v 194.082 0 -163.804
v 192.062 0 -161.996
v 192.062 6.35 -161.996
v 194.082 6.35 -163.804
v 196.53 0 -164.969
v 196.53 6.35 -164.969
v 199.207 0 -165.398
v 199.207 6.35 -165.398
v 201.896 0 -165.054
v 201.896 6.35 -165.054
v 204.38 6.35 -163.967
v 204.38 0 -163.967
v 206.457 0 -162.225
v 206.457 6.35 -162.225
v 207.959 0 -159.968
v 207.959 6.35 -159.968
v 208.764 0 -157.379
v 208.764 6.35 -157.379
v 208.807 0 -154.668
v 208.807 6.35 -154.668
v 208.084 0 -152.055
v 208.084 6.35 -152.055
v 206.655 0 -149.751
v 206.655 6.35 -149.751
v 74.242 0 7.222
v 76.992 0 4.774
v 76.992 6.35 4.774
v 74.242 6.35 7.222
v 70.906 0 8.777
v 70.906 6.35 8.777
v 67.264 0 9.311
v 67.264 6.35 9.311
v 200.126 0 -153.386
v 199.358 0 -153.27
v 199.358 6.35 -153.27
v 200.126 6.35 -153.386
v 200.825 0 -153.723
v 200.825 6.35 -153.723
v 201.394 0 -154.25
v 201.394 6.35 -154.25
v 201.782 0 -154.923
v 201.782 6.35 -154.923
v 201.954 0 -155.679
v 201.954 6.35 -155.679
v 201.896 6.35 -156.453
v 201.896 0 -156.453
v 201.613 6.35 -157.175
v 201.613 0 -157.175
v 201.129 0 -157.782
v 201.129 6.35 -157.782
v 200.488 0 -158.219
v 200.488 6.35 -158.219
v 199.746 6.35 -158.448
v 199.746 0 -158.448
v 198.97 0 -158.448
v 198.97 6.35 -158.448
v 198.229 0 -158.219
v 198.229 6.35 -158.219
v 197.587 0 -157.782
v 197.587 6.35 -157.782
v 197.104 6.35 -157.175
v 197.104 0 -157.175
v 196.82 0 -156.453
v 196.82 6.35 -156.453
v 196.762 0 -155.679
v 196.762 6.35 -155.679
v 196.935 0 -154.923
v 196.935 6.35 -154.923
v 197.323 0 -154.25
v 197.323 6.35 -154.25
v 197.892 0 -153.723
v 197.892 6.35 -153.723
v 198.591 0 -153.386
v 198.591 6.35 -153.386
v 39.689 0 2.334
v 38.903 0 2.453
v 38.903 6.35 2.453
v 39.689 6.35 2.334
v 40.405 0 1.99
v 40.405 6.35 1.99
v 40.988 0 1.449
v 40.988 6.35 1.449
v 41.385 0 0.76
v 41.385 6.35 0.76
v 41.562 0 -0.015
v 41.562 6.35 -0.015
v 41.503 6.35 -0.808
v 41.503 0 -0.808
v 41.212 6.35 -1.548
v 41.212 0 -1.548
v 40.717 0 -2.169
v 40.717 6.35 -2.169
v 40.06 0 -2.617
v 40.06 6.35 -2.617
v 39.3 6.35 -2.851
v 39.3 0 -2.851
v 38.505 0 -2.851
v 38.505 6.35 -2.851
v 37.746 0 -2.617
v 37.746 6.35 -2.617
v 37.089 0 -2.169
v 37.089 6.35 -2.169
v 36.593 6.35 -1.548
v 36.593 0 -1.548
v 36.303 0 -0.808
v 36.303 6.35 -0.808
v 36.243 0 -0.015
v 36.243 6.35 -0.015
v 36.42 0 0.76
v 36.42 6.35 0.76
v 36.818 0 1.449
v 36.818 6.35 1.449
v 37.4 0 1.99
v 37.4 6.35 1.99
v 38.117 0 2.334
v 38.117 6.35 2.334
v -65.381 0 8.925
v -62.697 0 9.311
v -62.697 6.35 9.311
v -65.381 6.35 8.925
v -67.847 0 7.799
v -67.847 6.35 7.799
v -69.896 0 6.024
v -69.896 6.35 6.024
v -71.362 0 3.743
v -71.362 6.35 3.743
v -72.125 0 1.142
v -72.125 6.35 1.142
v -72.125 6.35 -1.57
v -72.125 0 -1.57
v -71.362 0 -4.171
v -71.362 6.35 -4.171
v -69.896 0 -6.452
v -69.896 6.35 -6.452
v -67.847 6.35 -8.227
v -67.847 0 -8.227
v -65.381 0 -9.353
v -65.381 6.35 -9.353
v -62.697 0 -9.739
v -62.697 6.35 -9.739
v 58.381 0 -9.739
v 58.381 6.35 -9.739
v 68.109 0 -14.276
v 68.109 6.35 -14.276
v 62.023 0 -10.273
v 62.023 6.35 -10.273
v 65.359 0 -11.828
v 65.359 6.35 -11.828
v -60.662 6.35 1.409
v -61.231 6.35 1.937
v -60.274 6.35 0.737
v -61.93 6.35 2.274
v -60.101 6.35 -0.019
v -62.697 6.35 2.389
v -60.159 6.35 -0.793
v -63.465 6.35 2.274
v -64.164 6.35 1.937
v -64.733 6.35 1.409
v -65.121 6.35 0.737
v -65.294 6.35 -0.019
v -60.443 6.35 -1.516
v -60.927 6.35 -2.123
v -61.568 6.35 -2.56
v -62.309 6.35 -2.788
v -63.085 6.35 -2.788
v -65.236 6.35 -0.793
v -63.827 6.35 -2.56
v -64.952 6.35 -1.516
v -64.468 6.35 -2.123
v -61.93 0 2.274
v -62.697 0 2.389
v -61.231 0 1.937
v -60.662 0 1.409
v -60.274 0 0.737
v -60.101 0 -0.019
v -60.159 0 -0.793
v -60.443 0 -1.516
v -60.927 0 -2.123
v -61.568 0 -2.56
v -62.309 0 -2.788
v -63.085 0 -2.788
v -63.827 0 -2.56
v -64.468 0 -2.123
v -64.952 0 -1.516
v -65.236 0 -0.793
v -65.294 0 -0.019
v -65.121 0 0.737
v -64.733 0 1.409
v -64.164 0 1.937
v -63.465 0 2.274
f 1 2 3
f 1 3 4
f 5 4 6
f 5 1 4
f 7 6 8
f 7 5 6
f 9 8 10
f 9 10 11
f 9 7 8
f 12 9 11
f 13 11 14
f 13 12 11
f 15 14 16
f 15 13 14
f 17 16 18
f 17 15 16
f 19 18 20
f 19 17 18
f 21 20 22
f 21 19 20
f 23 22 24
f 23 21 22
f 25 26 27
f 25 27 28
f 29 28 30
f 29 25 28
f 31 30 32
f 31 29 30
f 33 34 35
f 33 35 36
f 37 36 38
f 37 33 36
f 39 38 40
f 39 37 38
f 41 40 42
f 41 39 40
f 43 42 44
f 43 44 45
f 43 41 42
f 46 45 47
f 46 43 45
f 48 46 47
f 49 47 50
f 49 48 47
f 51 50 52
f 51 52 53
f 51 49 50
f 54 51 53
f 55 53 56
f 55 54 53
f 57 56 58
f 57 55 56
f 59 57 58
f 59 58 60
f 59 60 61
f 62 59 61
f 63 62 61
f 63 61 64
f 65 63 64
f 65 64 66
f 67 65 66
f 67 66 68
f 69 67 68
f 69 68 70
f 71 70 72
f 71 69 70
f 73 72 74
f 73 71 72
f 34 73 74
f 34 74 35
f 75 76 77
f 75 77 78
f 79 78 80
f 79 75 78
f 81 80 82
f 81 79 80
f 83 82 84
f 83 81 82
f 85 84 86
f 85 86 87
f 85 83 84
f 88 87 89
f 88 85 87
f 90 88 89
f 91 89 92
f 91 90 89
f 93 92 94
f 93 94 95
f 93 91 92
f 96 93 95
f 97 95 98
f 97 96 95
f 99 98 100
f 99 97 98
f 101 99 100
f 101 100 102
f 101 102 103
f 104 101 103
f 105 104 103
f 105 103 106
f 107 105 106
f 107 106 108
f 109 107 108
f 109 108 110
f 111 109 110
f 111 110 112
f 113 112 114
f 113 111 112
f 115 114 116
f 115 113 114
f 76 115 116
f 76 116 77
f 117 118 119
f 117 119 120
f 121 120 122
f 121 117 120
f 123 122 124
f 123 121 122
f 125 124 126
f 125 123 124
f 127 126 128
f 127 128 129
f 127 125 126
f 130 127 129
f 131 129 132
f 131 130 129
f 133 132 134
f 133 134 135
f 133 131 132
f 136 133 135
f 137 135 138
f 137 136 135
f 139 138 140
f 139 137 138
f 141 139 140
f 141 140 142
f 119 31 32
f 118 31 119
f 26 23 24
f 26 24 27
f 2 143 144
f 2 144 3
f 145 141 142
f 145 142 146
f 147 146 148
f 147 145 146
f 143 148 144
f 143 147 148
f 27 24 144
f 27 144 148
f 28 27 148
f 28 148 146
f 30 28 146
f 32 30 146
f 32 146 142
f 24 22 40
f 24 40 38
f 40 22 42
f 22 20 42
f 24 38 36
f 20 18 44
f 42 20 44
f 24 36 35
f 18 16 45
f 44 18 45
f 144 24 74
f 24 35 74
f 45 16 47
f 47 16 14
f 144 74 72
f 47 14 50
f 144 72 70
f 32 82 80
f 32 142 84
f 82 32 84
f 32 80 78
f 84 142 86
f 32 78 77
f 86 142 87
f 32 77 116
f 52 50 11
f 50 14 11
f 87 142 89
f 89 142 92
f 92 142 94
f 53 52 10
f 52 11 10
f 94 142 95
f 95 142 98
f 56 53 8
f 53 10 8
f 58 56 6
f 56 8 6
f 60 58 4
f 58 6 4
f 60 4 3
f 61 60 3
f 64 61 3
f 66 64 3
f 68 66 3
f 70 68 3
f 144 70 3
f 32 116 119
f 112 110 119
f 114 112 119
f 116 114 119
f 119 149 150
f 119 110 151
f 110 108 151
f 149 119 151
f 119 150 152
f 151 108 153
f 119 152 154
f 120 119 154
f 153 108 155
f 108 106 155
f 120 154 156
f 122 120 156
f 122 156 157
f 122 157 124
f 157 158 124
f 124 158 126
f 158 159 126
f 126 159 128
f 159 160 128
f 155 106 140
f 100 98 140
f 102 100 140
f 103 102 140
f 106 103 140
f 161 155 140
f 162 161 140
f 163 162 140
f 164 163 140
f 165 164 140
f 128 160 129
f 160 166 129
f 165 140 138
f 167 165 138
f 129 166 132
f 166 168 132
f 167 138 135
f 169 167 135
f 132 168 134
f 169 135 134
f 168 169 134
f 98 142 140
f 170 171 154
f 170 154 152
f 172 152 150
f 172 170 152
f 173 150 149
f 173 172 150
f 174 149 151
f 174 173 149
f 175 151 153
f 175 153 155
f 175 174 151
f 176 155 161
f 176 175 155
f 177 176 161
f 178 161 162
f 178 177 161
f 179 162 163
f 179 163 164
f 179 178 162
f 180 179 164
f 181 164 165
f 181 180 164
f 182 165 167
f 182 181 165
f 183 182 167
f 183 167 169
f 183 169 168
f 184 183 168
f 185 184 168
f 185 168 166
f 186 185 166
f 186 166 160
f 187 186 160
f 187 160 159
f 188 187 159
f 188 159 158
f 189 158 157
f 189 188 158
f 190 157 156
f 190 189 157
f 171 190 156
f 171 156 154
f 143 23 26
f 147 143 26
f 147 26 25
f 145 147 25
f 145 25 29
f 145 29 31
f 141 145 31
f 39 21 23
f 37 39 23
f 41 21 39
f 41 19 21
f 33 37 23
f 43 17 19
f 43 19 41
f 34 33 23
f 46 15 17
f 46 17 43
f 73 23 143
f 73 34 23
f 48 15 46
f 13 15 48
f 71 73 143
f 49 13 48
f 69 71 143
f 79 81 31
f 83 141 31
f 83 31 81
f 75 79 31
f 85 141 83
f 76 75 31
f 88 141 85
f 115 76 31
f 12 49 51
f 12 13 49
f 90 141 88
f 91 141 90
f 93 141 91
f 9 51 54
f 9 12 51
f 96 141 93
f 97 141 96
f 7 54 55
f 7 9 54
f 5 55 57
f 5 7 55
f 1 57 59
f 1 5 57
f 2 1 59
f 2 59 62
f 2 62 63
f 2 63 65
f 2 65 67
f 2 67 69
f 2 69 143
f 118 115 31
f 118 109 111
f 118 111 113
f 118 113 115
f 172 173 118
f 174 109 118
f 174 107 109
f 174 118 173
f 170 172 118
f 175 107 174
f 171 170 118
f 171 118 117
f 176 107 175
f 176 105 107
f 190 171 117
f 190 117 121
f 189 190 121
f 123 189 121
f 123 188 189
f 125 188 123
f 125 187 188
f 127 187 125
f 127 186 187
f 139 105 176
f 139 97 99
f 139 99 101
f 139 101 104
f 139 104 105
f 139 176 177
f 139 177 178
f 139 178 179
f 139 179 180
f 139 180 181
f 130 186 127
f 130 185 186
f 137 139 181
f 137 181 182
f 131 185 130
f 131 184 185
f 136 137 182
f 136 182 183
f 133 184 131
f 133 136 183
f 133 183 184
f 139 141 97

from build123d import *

# Parameters (mm, degrees)
SKETCH2_R           = 2.6035
SKETCH2_R_2         = 2.667
BOSS_EXTRUDE1_DEPTH = 6.35


with BuildPart() as part:
    # Sketch2 → Boss-Extrude1 (new body)
    with BuildSketch(Plane(origin=(0, 0, 0), x_dir=(1, 0, 0), z_dir=(0, 1, 0))):
        with BuildLine():
            Line((68.109325708, 14.275642301), (192.061641465, 161.996259914))
            ThreePointArc((192.061641465, 161.996259914), (205.480766768, 163.170281253), (206.654788106, 149.75115595))
            Line((206.654788106, 149.75115595), (76.992486596, -4.774357699))
            ThreePointArc((76.992486596, -4.774357699), (72.630974093, -8.121063952), (67.263722169, -9.310955056))
            Line((67.263722169, -9.310955056), (64.302668539, -9.310955056))
            Line((64.302668539, -9.310955056), (-62.697331461, -9.310955056))
            ThreePointArc((-62.697331461, -9.310955056), (-72.222331461, 0.214044944), (-62.697331461, 9.739044944))
            Line((-62.697331461, 9.739044944), (58.380561281, 9.739044944))
            ThreePointArc((58.380561281, 9.739044944), (63.747813205, 10.928936048), (68.109325708, 14.275642301))
        make_face()
        with Locations(Location((-62.697331461, 0.214044944, 0), (0, 0, 270))):
            Circle(SKETCH2_R, mode=Mode.SUBTRACT)
        with Locations(Location((199.358214786, 155.873707932, 0), (0, 0, 270))):
            Circle(SKETCH2_R, mode=Mode.SUBTRACT)
        with Locations(Location((38.902668539, 0.214044944, 0), (0, 0, 270))):
            Circle(SKETCH2_R_2, mode=Mode.SUBTRACT)
    extrude(amount=BOSS_EXTRUDE1_DEPTH)


solid = part.part
